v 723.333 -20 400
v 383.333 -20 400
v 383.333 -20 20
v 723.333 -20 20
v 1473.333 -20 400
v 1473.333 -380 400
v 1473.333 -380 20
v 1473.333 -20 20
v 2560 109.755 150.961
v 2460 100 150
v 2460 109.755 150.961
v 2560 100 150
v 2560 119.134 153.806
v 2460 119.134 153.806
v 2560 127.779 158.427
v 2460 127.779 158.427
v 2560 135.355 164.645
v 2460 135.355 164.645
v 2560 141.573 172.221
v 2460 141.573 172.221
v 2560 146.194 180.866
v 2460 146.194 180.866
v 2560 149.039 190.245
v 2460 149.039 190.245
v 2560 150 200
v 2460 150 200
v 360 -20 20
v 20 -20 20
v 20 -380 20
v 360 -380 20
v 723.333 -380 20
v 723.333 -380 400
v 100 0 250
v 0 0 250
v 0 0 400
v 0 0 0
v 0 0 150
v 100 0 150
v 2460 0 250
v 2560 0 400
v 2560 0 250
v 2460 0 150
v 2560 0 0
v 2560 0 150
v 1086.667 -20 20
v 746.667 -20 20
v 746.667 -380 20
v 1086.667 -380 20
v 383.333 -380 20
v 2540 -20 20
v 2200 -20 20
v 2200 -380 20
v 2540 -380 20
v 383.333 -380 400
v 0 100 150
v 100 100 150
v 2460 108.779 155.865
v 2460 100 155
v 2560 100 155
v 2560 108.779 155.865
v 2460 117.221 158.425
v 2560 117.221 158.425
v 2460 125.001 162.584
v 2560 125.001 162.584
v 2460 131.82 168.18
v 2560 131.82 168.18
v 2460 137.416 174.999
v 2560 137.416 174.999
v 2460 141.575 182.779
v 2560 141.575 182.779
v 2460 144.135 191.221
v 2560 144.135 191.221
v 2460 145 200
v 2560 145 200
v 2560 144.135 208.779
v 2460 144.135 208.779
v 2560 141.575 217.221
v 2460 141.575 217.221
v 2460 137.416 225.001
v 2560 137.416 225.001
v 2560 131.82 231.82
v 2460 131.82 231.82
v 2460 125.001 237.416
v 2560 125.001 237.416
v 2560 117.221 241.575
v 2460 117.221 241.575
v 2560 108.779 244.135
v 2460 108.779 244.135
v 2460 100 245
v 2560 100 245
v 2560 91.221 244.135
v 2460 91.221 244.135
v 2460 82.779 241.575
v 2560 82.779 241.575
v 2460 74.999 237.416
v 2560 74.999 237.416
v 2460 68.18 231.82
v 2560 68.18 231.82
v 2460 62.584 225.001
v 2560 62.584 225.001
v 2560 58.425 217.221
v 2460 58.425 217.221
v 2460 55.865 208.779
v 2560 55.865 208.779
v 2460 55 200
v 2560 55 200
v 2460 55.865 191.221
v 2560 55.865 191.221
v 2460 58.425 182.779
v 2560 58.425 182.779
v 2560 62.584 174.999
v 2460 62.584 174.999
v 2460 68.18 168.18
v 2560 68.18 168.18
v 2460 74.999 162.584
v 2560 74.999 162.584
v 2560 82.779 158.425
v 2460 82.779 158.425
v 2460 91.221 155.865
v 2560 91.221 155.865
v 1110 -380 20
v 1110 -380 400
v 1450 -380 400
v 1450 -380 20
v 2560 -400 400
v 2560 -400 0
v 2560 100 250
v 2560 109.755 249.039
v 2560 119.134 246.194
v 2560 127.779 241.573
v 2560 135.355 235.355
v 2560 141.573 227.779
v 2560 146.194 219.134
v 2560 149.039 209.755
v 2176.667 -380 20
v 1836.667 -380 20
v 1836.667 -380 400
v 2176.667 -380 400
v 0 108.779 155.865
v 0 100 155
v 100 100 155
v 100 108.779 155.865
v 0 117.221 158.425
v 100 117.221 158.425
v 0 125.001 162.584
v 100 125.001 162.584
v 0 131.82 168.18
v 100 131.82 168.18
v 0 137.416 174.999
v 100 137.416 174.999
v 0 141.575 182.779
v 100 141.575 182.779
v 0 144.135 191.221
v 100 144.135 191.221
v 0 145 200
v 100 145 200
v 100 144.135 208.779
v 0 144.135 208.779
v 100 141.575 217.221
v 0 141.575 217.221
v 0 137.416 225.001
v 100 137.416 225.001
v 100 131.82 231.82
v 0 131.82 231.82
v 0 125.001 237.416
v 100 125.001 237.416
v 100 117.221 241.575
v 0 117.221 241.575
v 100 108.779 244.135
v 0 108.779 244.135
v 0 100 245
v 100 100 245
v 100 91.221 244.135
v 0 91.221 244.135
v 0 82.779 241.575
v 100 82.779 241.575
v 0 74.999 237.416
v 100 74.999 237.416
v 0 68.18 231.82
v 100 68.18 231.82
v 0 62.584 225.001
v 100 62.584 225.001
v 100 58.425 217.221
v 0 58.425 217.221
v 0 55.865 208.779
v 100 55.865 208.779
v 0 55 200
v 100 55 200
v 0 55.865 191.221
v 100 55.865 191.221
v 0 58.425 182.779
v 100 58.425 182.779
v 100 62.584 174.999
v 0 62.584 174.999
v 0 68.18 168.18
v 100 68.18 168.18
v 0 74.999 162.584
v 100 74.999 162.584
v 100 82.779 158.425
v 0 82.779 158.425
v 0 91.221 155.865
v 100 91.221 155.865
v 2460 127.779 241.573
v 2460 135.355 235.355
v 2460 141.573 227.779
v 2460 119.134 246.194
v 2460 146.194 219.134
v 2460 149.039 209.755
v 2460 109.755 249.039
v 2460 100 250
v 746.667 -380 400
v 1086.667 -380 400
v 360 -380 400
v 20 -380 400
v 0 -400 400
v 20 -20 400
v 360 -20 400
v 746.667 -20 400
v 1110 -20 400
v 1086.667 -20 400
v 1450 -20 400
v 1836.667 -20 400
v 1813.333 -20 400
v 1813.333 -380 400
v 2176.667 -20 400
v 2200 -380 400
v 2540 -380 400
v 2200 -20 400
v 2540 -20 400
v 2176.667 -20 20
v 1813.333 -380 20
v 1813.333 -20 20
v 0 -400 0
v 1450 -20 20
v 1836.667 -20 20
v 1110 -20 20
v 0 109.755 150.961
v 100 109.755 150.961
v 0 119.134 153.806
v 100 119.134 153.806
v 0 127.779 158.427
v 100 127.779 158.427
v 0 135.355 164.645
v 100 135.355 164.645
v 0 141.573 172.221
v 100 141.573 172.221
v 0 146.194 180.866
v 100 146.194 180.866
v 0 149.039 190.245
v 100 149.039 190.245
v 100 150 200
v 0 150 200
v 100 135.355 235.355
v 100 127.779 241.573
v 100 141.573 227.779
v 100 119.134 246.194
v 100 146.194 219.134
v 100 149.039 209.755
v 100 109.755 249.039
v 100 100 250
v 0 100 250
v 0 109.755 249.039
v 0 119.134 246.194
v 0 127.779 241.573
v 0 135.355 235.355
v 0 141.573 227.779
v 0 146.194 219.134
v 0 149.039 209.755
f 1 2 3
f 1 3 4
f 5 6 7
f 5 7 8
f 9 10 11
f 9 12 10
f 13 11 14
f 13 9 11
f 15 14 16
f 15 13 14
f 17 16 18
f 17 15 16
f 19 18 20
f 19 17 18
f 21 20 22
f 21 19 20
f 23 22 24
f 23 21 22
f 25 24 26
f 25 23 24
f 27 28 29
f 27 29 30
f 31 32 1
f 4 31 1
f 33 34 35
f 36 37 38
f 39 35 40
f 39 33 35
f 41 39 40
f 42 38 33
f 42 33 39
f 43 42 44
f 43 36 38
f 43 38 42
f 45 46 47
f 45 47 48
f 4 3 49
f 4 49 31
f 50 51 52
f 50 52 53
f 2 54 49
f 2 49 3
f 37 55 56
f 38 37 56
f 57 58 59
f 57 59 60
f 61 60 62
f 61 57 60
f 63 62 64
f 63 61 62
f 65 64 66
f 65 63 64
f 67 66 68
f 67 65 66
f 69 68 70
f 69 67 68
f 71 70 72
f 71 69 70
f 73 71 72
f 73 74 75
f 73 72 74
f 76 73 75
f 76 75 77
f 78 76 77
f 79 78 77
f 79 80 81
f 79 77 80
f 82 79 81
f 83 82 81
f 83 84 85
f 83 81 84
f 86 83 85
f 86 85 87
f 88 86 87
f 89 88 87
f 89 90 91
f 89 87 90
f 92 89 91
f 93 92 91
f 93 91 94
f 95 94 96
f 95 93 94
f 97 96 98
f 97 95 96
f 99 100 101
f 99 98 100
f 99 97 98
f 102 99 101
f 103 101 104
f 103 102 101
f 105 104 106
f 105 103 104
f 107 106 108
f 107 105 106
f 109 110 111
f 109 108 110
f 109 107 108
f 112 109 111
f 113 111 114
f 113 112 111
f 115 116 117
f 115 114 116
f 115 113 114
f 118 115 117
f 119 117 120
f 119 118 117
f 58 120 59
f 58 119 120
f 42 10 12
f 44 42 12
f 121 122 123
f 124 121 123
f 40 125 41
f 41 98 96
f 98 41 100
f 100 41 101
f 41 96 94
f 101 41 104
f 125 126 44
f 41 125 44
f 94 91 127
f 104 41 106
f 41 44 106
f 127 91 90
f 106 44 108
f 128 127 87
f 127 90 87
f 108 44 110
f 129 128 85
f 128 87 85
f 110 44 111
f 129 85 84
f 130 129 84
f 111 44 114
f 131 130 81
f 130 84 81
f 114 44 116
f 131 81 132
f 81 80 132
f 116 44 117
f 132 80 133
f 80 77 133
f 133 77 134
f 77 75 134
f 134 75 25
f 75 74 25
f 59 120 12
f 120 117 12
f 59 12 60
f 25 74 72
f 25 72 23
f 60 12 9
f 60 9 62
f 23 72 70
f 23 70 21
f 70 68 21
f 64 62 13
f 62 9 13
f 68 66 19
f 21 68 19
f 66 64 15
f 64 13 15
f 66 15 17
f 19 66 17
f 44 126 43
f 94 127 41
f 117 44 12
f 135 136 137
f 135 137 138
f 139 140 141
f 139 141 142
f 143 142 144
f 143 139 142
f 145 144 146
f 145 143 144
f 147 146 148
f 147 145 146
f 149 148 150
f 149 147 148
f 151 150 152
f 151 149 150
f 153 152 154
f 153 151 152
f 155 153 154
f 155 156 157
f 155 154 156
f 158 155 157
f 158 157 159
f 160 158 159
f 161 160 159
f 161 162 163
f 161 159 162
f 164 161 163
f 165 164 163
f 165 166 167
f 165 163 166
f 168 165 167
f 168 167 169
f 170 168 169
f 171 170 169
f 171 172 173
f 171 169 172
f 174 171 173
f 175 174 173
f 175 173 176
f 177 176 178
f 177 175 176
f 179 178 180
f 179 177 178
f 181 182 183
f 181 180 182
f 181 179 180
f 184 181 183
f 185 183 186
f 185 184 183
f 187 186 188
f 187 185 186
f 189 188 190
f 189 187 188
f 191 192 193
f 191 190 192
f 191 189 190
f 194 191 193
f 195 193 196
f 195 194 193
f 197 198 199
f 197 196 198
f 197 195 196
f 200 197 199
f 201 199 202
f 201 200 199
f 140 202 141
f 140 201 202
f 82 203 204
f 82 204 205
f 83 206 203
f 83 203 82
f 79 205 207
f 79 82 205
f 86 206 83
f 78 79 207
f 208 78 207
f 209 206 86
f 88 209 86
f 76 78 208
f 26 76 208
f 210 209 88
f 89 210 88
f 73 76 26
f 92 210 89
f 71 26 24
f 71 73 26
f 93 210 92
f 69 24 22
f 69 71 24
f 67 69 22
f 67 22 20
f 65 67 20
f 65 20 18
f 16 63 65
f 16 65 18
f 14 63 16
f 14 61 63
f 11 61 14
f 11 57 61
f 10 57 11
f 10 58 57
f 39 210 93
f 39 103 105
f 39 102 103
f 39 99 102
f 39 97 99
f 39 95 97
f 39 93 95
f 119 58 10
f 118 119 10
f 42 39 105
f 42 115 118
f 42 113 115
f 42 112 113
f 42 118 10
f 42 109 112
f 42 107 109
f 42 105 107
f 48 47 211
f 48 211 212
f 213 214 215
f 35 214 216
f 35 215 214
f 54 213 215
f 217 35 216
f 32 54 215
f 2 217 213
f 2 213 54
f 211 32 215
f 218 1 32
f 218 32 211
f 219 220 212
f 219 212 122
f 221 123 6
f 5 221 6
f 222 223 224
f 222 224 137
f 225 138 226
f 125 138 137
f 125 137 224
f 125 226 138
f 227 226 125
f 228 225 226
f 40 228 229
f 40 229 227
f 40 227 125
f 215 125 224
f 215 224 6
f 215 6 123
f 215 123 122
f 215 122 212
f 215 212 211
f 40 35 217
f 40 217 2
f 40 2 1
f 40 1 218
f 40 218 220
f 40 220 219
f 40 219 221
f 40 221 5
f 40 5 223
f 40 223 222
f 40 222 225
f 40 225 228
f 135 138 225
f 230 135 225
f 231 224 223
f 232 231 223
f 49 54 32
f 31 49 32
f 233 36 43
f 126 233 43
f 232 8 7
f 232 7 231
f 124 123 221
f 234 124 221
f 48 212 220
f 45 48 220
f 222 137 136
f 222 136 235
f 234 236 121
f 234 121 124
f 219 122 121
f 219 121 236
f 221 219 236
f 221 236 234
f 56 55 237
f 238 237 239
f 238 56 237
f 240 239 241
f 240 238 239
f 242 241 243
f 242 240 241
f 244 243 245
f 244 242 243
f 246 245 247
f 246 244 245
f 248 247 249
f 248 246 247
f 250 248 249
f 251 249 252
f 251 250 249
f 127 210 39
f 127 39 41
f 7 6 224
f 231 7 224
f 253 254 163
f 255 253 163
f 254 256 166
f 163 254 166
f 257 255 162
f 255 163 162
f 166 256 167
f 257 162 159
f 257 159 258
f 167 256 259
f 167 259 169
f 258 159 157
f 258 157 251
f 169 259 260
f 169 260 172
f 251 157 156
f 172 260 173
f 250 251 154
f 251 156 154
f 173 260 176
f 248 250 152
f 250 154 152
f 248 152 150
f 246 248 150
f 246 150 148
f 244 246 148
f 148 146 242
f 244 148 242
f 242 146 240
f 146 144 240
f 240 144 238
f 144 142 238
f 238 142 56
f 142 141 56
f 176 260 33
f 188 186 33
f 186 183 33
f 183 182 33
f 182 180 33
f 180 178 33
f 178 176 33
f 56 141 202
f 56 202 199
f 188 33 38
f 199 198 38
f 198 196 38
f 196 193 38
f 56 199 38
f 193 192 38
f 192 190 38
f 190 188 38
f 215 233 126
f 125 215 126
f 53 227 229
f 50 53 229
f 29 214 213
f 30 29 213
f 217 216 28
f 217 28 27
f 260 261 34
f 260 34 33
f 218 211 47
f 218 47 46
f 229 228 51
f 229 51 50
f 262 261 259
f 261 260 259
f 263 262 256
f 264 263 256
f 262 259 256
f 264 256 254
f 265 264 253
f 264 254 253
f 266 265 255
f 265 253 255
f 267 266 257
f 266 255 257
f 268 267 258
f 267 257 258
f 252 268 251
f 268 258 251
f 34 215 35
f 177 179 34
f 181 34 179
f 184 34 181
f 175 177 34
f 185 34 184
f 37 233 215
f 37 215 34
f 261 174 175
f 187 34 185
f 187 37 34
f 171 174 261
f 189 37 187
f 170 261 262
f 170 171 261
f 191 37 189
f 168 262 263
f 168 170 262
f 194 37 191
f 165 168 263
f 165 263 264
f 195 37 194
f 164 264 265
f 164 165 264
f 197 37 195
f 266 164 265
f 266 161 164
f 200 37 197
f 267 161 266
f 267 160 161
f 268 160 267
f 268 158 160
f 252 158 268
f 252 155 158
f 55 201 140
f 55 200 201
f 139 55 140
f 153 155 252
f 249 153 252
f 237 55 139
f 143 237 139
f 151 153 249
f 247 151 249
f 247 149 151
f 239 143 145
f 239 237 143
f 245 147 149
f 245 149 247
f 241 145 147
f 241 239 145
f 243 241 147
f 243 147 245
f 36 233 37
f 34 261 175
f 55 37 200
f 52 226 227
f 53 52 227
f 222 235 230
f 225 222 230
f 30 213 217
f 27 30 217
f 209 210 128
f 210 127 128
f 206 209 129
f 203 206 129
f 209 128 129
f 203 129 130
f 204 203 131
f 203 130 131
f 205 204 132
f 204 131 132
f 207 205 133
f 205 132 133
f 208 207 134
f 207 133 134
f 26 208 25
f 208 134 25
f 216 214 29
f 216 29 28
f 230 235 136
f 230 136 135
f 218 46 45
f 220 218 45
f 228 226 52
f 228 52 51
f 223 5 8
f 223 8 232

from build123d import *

# Parameters (mm, degrees)
SKETCH1_W               = 2560
SKETCH1_H               = 400
BOSS_EXTRUDE1_DEPTH     = 400
SKETCH2_W               = 340
SKETCH2_H               = 360
CUT_EXTRUDE1_DEPTH      = 380
SKETCH3_W               = 100
SKETCH3_H               = 100
BOSS_EXTRUDE2_DEPTH     = 150
FILLET1_R               = 50
SKETCH4_W               = 100
SKETCH4_H               = 100
BOSS_EXTRUDE3_DEPTH     = 150
FILLET2_R               = 50
CUT_EXTRUDE2_DEPTH      = 2622.755137308
CUT_EXTRUDE2_DEPTH_BACK = 2622.755137308
SKETCH5_R               = 45


with BuildPart() as part:
    # Sketch1 → Boss-Extrude1 (new body)
    with BuildSketch(Plane.XY):
        with Locations((1280, -200)):
            Rectangle(SKETCH1_W, SKETCH1_H)
    extrude(amount=BOSS_EXTRUDE1_DEPTH)

    # Sketch2 → Cut-Extrude1 (cut)
    with BuildSketch(Plane.XY.offset(400)):
        with Locations((190, -200)):
            Rectangle(SKETCH2_W, SKETCH2_H)
        with Locations((553.333333333, -200)):
            Rectangle(SKETCH2_W, SKETCH2_H)
        with Locations((916.666666667, -200)):
            Rectangle(SKETCH2_W, SKETCH2_H)
        with Locations((1280, -200)):
            Rectangle(SKETCH2_W, SKETCH2_H)
        with Locations((1643.333333333, -200)):
            Rectangle(SKETCH2_W, SKETCH2_H)
        with Locations((2006.666666667, -200)):
            Rectangle(SKETCH2_W, SKETCH2_H)
        with Locations((2370, -200)):
            Rectangle(SKETCH2_W, SKETCH2_H)
    extrude(amount=-CUT_EXTRUDE1_DEPTH, mode=Mode.SUBTRACT)

    # Sketch3 → Boss-Extrude2 (add)
    with BuildSketch(Plane(origin=(0, 0, 0), x_dir=(1, 0, 0), z_dir=(0, 1, 0))):
        with Locations((50, -200)):
            Rectangle(SKETCH3_W, SKETCH3_H)
    extrude(amount=BOSS_EXTRUDE2_DEPTH)

    # Fillet1
    fillet1_edges = [part.edges().sort_by_distance(p)[0] for p in [
        (50, 150, 150),
        (50, 150, 250),
    ]]
    fillet(fillet1_edges, radius=FILLET1_R - 0.0001)  # a hair under: the kernel refuses the full size

    # Sketch4 → Boss-Extrude3 (add)
    with BuildSketch(Plane(origin=(0, 0, 0), x_dir=(1, 0, 0), z_dir=(0, 1, 0))):
        with Locations((2510, -200)):
            Rectangle(SKETCH4_W, SKETCH4_H)
    extrude(amount=BOSS_EXTRUDE3_DEPTH)

    # Fillet2
    fillet2_edges = [part.edges().sort_by_distance(p)[0] for p in [
        (2510, 150, 150),
        (2510, 150, 250),
    ]]
    fillet(fillet2_edges, radius=FILLET2_R - 0.0001)  # a hair under: the kernel refuses the full size

    # Sketch5 → Cut-Extrude2 (cut, two sides: drawn at the far end of the back side and taken through both)
    with BuildSketch(Plane(origin=(2560, 0, 0), x_dir=(0, 0, -1), z_dir=(1, 0, 0)).offset(-CUT_EXTRUDE2_DEPTH_BACK)):
        with Locations((-200, 100)):
            Circle(SKETCH5_R)
    extrude(amount=CUT_EXTRUDE2_DEPTH + CUT_EXTRUDE2_DEPTH_BACK, mode=Mode.SUBTRACT)


solid = part.part
